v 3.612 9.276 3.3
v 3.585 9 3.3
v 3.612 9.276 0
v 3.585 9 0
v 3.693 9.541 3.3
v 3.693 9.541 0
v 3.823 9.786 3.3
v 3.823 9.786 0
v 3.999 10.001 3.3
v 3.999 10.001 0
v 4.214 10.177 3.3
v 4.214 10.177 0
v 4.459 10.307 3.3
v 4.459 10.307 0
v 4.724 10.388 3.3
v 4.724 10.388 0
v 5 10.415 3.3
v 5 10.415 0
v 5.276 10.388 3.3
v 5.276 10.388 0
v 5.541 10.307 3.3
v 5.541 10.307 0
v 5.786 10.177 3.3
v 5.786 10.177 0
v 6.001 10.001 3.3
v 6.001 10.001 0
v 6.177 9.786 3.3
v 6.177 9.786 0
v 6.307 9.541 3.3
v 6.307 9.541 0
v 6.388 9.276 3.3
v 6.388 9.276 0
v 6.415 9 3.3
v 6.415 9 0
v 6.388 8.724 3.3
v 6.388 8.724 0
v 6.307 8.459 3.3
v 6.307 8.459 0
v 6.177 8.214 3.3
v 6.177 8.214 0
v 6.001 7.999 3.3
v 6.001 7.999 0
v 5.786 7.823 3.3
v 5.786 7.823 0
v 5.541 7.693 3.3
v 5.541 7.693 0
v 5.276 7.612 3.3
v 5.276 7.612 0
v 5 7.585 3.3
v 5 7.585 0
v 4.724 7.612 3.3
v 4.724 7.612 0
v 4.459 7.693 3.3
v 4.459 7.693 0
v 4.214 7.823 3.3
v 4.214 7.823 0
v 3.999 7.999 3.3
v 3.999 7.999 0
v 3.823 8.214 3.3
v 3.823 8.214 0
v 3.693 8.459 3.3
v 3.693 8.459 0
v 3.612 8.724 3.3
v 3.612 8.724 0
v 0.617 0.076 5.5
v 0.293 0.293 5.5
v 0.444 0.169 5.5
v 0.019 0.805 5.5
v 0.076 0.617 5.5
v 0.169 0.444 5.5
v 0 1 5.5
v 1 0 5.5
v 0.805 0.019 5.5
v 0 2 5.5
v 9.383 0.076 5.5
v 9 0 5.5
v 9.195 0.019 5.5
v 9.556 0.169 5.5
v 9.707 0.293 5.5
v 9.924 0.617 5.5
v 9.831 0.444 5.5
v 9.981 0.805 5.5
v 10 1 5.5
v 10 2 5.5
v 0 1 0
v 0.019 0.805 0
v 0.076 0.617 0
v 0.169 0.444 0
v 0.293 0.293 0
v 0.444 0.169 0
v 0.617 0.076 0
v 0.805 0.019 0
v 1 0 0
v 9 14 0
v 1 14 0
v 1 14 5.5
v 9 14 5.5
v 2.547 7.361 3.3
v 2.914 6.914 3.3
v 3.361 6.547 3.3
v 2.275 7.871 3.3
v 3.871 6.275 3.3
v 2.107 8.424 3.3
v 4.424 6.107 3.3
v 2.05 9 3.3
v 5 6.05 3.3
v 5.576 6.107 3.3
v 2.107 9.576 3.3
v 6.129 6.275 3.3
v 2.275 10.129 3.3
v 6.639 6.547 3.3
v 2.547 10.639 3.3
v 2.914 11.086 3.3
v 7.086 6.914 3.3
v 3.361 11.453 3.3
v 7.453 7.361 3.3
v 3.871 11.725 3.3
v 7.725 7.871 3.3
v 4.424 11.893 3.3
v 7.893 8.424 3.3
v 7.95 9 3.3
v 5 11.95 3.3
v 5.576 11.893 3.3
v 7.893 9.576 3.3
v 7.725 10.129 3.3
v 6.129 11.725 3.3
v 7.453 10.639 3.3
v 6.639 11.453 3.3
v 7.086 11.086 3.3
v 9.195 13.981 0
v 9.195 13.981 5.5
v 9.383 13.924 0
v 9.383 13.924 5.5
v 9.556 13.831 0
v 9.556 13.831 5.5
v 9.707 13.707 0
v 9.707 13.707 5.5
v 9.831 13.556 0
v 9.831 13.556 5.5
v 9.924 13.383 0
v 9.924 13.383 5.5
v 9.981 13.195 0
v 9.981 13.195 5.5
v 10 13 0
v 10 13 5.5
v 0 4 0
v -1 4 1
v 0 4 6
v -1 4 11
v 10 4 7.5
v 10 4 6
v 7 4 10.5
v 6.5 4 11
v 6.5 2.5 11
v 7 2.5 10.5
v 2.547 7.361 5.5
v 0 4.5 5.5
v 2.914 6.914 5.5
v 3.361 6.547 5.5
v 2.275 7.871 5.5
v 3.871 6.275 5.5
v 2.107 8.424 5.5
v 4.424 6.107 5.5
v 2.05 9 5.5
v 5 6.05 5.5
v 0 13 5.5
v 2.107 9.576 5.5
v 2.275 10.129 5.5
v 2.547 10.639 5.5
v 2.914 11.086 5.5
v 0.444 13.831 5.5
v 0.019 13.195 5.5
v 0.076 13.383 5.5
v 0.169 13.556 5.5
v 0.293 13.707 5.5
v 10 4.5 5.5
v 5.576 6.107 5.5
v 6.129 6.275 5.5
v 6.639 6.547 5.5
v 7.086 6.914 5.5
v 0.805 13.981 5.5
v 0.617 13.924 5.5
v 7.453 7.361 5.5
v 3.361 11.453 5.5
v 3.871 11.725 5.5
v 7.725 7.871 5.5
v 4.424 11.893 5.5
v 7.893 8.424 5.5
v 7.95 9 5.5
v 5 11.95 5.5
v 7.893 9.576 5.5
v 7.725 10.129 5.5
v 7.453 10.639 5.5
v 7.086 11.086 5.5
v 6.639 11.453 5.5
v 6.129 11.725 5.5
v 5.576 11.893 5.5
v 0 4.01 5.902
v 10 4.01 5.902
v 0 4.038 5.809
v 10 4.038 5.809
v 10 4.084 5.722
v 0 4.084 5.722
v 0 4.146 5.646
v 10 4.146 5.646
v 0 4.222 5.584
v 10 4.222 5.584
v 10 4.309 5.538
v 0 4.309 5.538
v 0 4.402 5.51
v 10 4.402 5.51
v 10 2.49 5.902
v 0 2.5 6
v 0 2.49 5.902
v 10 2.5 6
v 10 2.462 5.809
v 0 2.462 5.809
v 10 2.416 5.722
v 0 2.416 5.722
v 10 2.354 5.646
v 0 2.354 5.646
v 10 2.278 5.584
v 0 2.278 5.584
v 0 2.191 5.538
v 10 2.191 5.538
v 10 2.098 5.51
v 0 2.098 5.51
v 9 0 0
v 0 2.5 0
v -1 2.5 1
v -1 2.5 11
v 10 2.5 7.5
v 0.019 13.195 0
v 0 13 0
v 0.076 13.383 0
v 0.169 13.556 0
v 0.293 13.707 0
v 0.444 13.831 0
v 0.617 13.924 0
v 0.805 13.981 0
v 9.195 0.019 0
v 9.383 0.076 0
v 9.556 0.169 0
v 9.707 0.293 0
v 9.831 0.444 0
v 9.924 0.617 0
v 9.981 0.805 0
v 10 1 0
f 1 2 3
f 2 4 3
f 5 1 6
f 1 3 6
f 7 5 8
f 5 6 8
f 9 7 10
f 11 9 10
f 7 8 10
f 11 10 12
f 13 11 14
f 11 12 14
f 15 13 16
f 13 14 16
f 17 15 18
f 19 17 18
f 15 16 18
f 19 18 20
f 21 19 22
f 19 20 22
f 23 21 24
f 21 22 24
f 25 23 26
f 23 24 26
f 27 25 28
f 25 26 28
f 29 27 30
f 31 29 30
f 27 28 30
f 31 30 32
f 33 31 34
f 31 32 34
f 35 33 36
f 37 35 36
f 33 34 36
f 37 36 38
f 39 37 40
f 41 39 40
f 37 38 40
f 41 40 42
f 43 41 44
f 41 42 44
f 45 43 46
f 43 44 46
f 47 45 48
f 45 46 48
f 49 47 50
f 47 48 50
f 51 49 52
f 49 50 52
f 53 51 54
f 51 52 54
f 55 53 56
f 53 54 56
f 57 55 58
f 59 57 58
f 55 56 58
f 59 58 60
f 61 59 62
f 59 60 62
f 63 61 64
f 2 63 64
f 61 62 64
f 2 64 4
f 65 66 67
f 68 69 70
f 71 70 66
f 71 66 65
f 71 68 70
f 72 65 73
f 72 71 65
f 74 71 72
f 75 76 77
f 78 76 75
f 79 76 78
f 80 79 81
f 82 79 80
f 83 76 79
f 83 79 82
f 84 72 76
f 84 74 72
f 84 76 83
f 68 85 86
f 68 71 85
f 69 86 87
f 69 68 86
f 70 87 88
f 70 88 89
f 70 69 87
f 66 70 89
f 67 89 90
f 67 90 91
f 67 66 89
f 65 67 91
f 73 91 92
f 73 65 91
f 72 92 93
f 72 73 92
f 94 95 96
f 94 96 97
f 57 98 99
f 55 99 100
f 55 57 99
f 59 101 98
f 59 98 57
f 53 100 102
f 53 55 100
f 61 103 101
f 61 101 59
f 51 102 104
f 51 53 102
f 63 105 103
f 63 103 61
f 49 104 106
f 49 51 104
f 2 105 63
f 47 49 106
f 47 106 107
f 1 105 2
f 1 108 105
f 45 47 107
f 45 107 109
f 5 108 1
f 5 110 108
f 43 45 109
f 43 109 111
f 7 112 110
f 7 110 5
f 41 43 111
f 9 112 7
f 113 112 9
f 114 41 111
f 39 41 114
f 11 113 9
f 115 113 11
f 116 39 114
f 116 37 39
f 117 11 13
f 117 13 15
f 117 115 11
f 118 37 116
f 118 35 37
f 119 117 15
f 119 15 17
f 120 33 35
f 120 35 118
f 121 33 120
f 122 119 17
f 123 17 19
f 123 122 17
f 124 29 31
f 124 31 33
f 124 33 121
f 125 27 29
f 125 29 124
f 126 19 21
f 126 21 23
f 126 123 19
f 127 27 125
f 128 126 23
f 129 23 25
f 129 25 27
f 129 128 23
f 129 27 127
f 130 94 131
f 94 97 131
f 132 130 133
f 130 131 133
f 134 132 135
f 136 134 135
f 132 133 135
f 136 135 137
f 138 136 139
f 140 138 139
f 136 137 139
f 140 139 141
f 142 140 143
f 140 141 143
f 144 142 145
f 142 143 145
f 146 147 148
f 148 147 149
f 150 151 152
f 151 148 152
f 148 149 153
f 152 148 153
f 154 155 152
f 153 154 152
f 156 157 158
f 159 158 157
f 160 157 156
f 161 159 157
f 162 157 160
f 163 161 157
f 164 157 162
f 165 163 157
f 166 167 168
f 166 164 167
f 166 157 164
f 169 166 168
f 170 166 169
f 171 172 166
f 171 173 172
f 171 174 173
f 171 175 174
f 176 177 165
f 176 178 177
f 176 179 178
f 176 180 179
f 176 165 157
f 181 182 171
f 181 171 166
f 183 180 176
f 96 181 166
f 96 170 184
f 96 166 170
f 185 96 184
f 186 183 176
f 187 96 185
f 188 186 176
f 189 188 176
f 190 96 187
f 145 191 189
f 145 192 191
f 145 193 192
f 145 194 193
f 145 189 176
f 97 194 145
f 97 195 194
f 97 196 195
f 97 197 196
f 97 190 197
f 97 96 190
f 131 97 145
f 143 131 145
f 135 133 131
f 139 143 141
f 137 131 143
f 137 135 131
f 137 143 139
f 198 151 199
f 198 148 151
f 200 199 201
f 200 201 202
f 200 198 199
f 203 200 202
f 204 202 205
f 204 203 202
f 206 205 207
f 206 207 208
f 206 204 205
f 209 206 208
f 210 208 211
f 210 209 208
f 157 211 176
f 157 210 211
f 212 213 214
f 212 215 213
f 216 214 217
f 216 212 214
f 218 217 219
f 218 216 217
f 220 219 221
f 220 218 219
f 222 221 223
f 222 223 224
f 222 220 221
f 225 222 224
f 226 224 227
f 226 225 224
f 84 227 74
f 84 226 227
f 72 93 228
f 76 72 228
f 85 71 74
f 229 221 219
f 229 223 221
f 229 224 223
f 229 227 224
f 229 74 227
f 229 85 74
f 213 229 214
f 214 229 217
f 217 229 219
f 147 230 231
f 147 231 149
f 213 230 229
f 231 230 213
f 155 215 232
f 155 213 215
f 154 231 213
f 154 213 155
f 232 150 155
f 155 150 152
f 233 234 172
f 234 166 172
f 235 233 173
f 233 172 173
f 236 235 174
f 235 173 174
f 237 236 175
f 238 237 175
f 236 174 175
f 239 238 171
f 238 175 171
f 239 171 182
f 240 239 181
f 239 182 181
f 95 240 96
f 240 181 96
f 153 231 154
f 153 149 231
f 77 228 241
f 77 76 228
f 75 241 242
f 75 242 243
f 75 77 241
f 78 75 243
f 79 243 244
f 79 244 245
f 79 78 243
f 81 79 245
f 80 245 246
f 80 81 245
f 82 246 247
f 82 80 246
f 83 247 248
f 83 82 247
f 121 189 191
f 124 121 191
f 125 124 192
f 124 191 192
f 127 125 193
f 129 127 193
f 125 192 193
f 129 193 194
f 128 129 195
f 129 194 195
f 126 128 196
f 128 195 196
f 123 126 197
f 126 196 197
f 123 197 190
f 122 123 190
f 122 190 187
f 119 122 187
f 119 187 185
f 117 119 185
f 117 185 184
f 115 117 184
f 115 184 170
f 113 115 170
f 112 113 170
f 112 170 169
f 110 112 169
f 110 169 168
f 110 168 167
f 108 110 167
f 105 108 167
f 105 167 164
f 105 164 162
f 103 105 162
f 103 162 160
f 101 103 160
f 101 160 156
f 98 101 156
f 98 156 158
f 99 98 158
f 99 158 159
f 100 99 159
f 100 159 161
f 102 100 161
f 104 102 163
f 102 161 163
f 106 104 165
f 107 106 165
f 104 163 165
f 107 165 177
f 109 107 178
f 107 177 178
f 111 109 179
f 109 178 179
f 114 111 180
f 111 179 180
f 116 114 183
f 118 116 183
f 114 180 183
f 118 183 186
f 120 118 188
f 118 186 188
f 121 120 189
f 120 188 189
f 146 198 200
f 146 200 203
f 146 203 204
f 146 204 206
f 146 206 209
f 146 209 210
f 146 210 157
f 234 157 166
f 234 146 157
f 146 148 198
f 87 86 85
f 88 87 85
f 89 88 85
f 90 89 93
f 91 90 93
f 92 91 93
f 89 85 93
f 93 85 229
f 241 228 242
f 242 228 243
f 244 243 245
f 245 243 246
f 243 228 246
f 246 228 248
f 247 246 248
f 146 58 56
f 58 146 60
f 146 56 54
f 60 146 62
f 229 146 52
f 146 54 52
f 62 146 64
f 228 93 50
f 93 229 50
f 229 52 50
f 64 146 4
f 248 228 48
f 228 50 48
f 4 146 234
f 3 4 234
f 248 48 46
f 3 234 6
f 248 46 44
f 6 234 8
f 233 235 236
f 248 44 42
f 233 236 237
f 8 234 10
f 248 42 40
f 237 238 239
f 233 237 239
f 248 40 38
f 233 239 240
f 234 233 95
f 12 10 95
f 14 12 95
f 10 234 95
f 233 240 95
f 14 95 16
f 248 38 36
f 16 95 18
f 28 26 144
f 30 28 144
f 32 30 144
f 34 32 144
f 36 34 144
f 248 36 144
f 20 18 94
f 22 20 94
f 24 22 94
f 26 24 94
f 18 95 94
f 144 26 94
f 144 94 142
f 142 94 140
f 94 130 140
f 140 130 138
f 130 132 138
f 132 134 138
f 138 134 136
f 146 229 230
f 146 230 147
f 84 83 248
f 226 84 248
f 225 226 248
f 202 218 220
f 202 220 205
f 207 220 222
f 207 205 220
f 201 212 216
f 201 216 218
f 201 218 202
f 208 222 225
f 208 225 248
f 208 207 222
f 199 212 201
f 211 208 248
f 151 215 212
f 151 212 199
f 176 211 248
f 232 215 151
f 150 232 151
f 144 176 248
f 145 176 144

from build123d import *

# Parameters (mm, degrees)
F0_W           = 10
F0_H           = 14
F1_DEPTH       = 5.5
F4_D           = 2.83
F4_CBORE_D     = 5.9
F4_CBORE_DEPTH = 2.2
F2_W           = 8
F2_H           = 1.5
F5_DEPTH       = 11
F6_SIZE        = 1
F7_R           = 1
F8_T4_DEPTH    = 1.5
F9_SIZE        = 0.49999
F10_R          = 0.5


# Not quite as in the source:
# - a fillet or chamfer that OpenCascade refuses, or shapes differently, is made with other operations: its cross-section is extruded or revolved along the edge and cut away or added
# - a fillet or chamfer is up to 0.001 mm smaller than in the source, because OpenCascade refuses the exact size


with BuildPart() as f1:
    # F0 (on Top) → F1 (new body)
    with BuildSketch(Plane.XY):
        with Locations((5, 7)):
            Rectangle(F0_W, F0_H)
    extrude(amount=F1_DEPTH)

    # F4 (through all)
    with Locations(Plane.XY.offset(5.5)):
        with Locations((5, 9)):
            CounterBoreHole(F4_D / 2, F4_CBORE_D / 2, F4_CBORE_DEPTH)

    # F2 (on Top) → F5 (join)
    with BuildSketch(Plane.XY):
        with Locations((3, 3.25)):
            Rectangle(F2_W, F2_H)
    extrude(amount=F5_DEPTH)

    # F6
    f6_edges = [f1.edges().sort_by_distance(p)[0] for p in [
        (-1, 3.25, 0),
    ]]
    chamfer(f6_edges, length=F6_SIZE)

    # F7
    f7_edges = [f1.edges().sort_by_distance(p)[0] for p in [
        (0, 14, 2.75),
        (10, 14, 2.75),
        (10, 0, 2.75),
        (0, 0, 2.75),
    ]]
    fillet(f7_edges, radius=F7_R)

    # F8: chamfer of 5 on 1 edges, made by hand


with BuildPart() as f8_tool2:
    # F8_s3 → F8_t4 (new body)
    with BuildSketch(Plane.XZ.offset(-4)):
        Polygon((12, 5.5), (7, 10.5), (7, 5.5), align=None)
    extrude(amount=F8_T4_DEPTH)

    split(bisect_by=Plane.YZ.offset(10), keep=Keep.BOTTOM)


with BuildPart() as f1_1:
    add(f1.part)

    # F8_t1: union F8_tool2
    add(f8_tool2.part)

    # F9 (size 0.5 in the source; OpenCascade refuses exactly that, so slightly less here)
    f9_edges = [f1_1.edges().sort_by_distance(p)[0] for p in [
        (7, 3.25, 11),
    ]]
    chamfer(f9_edges, length=F9_SIZE)

    # F10
    f10_edges = [f1_1.edges().sort_by_distance(p)[0] for p in [
        (5, 4, 5.5),
        (5, 2.5, 5.5),
    ]]
    fillet(f10_edges, radius=F10_R)


solid = f1_1.part
